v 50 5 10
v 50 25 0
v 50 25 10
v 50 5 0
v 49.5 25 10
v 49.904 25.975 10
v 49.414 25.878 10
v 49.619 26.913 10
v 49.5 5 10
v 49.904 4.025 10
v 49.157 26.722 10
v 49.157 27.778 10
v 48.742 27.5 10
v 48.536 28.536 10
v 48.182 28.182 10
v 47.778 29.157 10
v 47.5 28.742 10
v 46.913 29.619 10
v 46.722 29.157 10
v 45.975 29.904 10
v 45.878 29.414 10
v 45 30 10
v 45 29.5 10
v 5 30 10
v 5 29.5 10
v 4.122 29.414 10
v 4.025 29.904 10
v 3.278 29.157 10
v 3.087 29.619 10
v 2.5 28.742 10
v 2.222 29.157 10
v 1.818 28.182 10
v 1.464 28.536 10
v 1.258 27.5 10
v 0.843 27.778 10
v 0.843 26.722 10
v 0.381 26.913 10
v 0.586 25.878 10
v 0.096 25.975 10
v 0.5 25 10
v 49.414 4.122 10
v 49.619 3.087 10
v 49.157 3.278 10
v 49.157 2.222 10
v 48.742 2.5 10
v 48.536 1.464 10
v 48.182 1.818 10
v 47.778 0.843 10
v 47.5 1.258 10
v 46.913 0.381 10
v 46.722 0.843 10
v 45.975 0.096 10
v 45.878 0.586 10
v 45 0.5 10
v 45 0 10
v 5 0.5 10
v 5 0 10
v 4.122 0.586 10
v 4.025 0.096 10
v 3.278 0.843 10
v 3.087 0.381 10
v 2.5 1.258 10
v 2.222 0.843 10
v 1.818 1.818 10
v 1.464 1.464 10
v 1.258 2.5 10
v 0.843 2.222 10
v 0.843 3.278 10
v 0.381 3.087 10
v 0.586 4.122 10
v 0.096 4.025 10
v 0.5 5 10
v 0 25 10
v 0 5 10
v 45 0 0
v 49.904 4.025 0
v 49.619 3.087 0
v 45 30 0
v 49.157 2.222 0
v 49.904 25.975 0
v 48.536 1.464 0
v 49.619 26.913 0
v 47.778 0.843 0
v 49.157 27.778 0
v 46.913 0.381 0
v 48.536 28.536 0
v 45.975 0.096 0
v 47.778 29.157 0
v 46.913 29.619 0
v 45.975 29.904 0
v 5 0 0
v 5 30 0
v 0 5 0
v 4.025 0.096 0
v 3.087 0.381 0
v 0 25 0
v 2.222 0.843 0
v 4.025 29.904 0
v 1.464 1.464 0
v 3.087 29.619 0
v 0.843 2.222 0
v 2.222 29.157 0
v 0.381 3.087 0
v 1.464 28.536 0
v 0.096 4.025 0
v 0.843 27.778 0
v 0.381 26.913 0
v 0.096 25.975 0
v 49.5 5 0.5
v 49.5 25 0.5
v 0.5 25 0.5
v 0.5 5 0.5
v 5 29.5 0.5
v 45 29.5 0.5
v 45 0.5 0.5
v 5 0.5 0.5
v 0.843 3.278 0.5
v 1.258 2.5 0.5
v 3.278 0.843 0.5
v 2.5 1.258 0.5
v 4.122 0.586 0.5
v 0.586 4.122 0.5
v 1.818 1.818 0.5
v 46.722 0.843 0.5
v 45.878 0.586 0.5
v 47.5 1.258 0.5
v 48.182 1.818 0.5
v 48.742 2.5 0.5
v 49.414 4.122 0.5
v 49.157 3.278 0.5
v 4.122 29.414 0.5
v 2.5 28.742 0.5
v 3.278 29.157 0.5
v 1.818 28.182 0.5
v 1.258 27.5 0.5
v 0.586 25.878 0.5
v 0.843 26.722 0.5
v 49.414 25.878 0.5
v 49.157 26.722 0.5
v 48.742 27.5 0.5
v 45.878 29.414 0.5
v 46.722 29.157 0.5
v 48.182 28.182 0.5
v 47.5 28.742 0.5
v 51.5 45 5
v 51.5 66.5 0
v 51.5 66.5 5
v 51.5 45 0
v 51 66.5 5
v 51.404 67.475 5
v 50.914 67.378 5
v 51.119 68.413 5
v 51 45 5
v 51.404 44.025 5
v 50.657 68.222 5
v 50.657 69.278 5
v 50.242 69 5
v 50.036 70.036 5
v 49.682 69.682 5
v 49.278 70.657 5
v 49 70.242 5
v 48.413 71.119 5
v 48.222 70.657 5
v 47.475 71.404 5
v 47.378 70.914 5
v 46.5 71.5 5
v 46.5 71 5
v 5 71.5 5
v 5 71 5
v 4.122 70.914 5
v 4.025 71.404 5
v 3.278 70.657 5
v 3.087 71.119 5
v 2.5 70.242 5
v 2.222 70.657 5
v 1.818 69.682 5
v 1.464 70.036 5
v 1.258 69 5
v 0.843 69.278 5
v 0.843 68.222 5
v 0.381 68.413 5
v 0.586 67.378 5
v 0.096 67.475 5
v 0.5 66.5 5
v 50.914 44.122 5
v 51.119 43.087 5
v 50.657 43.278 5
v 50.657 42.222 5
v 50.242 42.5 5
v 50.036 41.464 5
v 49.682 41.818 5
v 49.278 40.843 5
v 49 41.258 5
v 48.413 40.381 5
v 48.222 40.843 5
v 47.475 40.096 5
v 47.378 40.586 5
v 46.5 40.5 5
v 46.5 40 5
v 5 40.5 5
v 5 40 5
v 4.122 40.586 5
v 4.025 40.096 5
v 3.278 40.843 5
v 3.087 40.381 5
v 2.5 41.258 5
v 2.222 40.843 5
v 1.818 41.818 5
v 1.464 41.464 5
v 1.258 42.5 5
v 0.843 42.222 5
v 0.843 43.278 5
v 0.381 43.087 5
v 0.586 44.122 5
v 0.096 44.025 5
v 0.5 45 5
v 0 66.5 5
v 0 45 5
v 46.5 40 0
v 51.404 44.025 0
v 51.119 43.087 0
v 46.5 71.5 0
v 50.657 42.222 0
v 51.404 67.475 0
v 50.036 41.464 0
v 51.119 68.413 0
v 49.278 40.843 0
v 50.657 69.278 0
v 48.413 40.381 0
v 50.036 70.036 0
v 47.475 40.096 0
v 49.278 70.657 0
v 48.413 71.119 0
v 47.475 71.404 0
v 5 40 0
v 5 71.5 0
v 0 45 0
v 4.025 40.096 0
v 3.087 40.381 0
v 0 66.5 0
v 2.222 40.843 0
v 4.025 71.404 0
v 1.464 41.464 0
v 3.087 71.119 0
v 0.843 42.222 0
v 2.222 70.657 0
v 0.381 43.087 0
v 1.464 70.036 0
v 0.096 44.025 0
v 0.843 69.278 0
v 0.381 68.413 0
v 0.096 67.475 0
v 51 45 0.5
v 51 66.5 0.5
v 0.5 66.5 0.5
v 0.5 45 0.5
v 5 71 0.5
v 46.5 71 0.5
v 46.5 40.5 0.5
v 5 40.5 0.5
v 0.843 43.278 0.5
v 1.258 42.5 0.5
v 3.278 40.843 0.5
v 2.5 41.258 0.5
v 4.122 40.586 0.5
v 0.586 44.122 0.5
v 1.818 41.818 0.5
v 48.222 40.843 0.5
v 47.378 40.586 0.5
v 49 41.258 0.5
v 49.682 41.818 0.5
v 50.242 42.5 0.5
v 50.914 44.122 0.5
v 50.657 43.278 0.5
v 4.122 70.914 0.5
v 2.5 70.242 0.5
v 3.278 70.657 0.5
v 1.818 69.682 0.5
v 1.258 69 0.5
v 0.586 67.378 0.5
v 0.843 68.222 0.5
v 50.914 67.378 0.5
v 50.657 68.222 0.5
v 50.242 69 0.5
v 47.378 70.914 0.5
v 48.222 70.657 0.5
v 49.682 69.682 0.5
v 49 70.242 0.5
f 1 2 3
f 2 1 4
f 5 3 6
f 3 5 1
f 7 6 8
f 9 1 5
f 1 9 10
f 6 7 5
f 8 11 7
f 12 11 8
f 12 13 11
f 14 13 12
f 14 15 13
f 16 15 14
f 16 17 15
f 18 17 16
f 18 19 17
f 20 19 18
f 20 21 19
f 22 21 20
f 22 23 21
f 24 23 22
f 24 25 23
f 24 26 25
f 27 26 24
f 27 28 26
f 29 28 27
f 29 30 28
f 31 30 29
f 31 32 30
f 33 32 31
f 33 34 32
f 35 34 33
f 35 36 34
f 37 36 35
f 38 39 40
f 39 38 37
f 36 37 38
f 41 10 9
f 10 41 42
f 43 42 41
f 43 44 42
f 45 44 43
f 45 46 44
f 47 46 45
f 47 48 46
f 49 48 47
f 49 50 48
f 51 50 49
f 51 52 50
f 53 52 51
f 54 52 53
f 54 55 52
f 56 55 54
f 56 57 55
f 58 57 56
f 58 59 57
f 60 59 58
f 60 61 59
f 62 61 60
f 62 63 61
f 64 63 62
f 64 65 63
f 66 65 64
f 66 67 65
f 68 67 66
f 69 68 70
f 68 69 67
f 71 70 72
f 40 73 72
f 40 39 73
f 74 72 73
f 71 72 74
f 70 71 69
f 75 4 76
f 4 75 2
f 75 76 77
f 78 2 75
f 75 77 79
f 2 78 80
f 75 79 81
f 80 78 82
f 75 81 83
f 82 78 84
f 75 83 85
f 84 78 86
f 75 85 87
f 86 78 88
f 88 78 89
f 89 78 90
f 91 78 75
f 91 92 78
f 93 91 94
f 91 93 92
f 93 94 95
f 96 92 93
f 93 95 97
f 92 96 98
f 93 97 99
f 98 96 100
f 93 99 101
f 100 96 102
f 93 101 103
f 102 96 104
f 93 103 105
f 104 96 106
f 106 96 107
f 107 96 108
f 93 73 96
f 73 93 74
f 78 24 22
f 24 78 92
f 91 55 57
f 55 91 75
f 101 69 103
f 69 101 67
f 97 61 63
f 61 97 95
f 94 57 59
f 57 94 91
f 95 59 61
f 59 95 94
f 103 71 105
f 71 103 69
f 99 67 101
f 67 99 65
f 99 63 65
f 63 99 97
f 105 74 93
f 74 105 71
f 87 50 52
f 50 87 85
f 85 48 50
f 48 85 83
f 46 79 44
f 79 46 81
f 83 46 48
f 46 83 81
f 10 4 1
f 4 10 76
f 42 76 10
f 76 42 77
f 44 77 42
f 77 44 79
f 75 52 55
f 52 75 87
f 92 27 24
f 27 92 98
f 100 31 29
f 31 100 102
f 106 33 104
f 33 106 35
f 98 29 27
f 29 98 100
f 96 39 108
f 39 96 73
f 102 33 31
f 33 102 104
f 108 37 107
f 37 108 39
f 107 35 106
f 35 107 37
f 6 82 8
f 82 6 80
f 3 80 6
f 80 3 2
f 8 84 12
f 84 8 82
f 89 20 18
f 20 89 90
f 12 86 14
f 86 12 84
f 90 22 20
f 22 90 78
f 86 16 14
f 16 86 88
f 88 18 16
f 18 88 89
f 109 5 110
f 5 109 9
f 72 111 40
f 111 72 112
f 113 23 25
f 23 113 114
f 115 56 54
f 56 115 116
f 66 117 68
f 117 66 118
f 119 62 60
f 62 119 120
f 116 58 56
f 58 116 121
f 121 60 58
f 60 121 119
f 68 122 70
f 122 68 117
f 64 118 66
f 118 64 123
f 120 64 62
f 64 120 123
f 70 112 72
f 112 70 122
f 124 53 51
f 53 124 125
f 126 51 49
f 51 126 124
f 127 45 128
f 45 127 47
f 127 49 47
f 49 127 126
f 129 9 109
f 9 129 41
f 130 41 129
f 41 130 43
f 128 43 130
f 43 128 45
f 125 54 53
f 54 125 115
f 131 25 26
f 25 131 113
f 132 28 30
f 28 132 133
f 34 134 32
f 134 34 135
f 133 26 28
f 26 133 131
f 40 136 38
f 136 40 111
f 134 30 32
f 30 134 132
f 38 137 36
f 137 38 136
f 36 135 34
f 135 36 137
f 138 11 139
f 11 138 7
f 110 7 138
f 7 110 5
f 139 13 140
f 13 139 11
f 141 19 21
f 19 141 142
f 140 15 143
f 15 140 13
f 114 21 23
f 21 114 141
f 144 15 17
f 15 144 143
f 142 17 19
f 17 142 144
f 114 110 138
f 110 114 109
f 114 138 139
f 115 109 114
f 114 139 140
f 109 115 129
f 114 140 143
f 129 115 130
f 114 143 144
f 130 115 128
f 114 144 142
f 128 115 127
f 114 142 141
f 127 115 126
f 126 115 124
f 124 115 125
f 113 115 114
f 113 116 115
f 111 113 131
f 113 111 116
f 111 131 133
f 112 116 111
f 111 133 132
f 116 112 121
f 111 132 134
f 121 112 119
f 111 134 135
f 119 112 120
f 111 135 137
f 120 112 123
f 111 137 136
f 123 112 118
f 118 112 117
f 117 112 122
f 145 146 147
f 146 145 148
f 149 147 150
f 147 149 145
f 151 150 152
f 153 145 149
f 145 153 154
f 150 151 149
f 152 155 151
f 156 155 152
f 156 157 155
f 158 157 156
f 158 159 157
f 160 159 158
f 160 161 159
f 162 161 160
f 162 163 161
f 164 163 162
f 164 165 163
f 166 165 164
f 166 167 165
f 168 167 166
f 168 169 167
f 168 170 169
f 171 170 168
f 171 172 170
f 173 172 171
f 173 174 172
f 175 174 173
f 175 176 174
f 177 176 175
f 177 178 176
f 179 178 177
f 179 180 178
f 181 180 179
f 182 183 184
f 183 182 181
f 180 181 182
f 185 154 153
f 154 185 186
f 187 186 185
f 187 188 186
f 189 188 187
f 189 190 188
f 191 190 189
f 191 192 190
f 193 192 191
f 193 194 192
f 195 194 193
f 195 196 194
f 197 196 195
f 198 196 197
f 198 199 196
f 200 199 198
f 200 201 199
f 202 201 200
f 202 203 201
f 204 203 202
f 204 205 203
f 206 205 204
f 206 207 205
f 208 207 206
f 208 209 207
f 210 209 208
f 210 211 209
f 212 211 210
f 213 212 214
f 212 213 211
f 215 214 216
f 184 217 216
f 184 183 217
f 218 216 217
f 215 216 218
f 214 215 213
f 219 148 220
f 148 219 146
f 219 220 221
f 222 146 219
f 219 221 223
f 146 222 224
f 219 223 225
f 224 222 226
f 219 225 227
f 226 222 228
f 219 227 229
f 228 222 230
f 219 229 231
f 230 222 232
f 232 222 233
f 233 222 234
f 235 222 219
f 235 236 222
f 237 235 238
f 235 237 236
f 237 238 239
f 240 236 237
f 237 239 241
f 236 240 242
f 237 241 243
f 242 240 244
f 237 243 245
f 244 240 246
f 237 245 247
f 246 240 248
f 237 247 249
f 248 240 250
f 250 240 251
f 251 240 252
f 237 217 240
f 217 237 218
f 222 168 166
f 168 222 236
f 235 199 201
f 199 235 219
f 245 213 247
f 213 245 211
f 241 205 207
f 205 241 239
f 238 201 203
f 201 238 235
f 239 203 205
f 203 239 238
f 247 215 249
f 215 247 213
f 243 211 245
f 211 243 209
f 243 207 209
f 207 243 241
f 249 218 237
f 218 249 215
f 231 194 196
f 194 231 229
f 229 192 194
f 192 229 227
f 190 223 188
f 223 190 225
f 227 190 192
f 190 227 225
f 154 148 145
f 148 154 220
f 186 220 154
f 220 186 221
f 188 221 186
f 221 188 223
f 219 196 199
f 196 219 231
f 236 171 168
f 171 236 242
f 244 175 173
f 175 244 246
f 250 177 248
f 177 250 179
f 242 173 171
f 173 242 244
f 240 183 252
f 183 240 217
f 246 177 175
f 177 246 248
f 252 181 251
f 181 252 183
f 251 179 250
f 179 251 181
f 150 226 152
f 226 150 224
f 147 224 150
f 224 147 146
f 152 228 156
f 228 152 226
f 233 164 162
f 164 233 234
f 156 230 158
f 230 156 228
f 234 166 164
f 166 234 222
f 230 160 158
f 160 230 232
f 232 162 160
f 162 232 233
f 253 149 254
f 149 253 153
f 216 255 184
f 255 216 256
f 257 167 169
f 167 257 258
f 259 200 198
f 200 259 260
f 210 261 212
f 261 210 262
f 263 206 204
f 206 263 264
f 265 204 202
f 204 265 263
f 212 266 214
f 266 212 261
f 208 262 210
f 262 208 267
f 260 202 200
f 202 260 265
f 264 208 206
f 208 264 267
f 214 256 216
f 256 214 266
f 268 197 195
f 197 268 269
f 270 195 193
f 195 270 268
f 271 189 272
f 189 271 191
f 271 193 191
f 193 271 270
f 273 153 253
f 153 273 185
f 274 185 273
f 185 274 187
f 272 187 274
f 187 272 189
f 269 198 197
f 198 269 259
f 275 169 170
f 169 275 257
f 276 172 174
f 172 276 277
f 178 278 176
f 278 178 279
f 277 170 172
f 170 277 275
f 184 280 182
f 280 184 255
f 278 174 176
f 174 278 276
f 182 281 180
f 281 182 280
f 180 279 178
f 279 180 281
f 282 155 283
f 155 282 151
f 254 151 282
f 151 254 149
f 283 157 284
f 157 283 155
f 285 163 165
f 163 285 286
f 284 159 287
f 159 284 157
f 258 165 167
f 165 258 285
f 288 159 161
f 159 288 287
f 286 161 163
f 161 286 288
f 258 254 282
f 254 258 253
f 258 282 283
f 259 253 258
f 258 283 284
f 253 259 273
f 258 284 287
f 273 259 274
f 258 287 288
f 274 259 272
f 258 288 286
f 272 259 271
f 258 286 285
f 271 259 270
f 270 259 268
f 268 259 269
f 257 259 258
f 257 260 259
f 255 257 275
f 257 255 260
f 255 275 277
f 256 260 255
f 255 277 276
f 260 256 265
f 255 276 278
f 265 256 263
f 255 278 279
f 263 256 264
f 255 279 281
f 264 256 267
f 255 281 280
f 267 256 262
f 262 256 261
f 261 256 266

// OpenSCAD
//outer size (x)
size_x=50;

//outer size (x)
size_y=30;


//wall thickness
size_z=0.5;

//radius or the rounded corners
corner_radius=5;

//total number of faces for all corners
corner_faces=32;

spacing=size_z+1;
size_x_2=size_x+spacing;
size_y_2=size_y+spacing;

//height of the box
rim_height=10;

rim_height_2=rim_height/2;

module plate (sizeX, sizeY, sizeZ, cornerRadius, cornerFaces)
{
	union()
	{
		difference()
		{
			cube([sizeX,sizeY,sizeZ]);		
			cube([cornerRadius,cornerRadius,	sizeZ+1]);
			translate([sizeX-cornerRadius,0,0]) cube([cornerRadius,cornerRadius,sizeZ+1]);
			translate([0,sizeY-cornerRadius,0]) cube([cornerRadius,cornerRadius,sizeZ+1]);
			translate([sizeX-cornerRadius,sizeY-cornerRadius,0]) cube([cornerRadius,cornerRadius,sizeZ+1]);
		}
		translate([cornerRadius,cornerRadius,0]) cylinder(r=cornerRadius,h=sizeZ, $fn=cornerFaces);
		translate([sizeX-cornerRadius,cornerRadius,0]) cylinder(r=cornerRadius,h=sizeZ, $fn=cornerFaces);
		translate([cornerRadius,sizeY-cornerRadius,0]) cylinder(r=cornerRadius,h=sizeZ, $fn=cornerFaces);
		translate([sizeX-cornerRadius,sizeY-cornerRadius,0]) cylinder(r=cornerRadius,h=sizeZ, $fn=cornerFaces);
	}
}


//Generate box
union()
{
	difference()
	{
		plate (size_x, size_y,rim_height, corner_radius, corner_faces);
		translate([size_z,size_z,0])
		plate (size_x-(2*size_z), size_y-(2*size_z),rim_height, corner_radius-size_z, corner_faces);
	}
	plate (size_x, size_y, size_z, corner_radius, corner_faces);
}

//Generate lid
translate([0,size_y+10,0])

//assembled view
//translate([size_x+(spacing/2),-(spacing/2),rim_height+size_z])
//rotate([0,180,0])


#union()
{
	difference()
	{
		plate (size_x_2, size_y_2,rim_height_2, corner_radius, corner_faces);
		translate([size_z,size_z,0])
		plate (size_x_2-(2*size_z), size_y_2-(2*size_z),rim_height_2, corner_radius-size_z, corner_faces);
	}
	plate (size_x_2, size_y_2, size_z, corner_radius, corner_faces);
}
